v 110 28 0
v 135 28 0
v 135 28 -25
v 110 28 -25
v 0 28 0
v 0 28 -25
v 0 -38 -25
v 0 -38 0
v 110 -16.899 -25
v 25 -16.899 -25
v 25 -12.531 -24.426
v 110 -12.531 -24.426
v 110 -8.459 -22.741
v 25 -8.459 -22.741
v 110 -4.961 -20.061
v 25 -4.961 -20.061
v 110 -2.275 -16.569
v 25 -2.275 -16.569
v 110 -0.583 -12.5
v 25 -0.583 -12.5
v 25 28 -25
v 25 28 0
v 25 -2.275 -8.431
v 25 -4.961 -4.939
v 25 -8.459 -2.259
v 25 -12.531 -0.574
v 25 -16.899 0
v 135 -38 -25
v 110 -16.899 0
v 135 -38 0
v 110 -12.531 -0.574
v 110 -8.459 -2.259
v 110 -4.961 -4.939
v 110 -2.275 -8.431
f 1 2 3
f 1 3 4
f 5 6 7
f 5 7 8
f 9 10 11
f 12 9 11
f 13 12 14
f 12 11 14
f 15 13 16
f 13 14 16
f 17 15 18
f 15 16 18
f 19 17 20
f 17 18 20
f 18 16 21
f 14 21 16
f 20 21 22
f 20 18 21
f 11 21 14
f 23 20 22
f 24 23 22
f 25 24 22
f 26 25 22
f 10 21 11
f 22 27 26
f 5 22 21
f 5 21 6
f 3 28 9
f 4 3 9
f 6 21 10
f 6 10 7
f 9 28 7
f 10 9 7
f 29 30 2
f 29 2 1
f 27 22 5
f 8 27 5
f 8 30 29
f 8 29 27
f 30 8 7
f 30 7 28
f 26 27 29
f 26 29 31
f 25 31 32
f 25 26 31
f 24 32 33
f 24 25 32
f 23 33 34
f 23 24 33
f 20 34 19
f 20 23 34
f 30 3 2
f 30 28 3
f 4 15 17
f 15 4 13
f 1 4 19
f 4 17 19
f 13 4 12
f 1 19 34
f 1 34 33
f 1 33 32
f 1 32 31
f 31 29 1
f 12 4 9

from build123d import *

# Parameters (mm, degrees)
F0_W        = 135
F0_H        = 25
F1_DEPTH    = 38
F2_W        = 25
F2_H        = 25
F3_DEPTH    = 28
F4_T1_DEPTH = 85


# Not quite as in the source:
# - a fillet or chamfer that OpenCascade refuses, or shapes differently, is made with other operations: its cross-section is extruded or revolved along the edge and cut away or added


with BuildPart() as f1:
    # F0 (on Front) → F1 (new body)
    with BuildSketch(Plane.XZ):
        with Locations((67.5, -12.5)):
            Rectangle(F0_W, F0_H)
    extrude(amount=F1_DEPTH)

    # F2 (on face) → F3 (join)
    with BuildSketch(Plane(origin=(0, 0, 0), x_dir=(-1, 0, 0), z_dir=(0, 1, 0))):
        with Locations((-122.5, -12.5)):
            Rectangle(F2_W, F2_H)
        with Locations((-12.5, -12.5)):
            Rectangle(F2_W, F2_H)
    extrude(amount=F3_DEPTH)

    # F4: fillet of radius 16.8994949366 on 2 edges, made by hand

    # F4_s2 → F4_t1 (cut)
    with BuildSketch(Plane.YZ.offset(25)):
        with BuildLine():
            ThreePointArc((-16.8994949366, 0), (-4.9497474683, -4.9497474683), (0, -16.8994949366))
            Line((0, -16.8994949366), (0, 0))
            Line((0, 0), (-16.8994949366, 0))
        make_face()
        with BuildLine():
            ThreePointArc((-16.8994949366, -25), (-4.9497474683, -20.0502525317), (0, -8.1005050634))
            Line((0, -8.1005050634), (0, -25))
            Line((0, -25), (-16.8994949366, -25))
        make_face()
    extrude(amount=F4_T1_DEPTH, mode=Mode.SUBTRACT)


solid = f1.part
